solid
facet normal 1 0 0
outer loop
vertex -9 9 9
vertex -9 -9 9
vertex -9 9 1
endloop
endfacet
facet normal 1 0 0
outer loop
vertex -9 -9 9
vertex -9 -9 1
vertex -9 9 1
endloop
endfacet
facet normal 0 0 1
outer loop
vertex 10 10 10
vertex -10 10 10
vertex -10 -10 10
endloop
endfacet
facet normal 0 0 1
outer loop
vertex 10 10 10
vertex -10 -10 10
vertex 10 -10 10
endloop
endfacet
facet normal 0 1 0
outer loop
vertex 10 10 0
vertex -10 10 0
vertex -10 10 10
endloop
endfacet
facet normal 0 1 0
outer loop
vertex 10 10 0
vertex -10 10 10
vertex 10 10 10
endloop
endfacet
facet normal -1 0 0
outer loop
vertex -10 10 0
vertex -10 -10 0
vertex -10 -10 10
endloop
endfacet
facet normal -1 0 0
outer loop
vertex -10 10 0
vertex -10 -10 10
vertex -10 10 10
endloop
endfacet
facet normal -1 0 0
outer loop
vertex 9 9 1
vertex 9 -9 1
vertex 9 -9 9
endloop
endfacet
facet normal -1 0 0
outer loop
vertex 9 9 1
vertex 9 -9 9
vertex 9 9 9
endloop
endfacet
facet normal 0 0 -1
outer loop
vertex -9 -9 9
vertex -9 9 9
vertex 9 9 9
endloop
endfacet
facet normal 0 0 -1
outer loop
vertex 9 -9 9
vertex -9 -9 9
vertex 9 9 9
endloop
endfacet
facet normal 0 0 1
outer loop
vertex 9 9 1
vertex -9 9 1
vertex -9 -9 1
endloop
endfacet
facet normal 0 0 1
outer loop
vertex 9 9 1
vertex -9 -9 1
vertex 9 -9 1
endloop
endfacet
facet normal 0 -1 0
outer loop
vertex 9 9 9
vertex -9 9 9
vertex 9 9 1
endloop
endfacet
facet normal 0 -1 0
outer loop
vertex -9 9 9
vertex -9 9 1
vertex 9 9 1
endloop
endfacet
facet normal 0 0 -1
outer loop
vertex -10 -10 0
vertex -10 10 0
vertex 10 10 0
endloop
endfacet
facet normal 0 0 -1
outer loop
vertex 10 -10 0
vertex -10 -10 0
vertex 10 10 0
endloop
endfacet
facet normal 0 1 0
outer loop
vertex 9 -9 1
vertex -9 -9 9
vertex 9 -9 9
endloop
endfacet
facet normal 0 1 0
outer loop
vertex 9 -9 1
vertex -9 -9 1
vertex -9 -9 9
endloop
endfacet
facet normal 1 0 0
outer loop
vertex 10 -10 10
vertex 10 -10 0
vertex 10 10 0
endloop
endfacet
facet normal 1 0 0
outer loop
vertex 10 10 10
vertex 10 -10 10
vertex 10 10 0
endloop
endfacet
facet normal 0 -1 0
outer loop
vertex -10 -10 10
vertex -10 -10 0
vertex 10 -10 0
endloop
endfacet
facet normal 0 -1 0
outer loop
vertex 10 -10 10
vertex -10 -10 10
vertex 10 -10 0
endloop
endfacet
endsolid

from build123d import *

# Parameters (mm, degrees)
F0_W     = 20
F0_H     = 20
F1_DEPTH = 10
F2_T     = -1


# Not quite as in the source:
# - a feature names something its author has since deleted; it is built from what else it names


with BuildPart() as f1:
    # F0 (on Top) → F1 (new body)
    with BuildSketch(Plane.XY):
        Rectangle(F0_W, F0_H)
    extrude(amount=F1_DEPTH)

    # F2 (hollow: no face is removed)
    offset(amount=F2_T, mode=Mode.SUBTRACT)


solid = f1.part
